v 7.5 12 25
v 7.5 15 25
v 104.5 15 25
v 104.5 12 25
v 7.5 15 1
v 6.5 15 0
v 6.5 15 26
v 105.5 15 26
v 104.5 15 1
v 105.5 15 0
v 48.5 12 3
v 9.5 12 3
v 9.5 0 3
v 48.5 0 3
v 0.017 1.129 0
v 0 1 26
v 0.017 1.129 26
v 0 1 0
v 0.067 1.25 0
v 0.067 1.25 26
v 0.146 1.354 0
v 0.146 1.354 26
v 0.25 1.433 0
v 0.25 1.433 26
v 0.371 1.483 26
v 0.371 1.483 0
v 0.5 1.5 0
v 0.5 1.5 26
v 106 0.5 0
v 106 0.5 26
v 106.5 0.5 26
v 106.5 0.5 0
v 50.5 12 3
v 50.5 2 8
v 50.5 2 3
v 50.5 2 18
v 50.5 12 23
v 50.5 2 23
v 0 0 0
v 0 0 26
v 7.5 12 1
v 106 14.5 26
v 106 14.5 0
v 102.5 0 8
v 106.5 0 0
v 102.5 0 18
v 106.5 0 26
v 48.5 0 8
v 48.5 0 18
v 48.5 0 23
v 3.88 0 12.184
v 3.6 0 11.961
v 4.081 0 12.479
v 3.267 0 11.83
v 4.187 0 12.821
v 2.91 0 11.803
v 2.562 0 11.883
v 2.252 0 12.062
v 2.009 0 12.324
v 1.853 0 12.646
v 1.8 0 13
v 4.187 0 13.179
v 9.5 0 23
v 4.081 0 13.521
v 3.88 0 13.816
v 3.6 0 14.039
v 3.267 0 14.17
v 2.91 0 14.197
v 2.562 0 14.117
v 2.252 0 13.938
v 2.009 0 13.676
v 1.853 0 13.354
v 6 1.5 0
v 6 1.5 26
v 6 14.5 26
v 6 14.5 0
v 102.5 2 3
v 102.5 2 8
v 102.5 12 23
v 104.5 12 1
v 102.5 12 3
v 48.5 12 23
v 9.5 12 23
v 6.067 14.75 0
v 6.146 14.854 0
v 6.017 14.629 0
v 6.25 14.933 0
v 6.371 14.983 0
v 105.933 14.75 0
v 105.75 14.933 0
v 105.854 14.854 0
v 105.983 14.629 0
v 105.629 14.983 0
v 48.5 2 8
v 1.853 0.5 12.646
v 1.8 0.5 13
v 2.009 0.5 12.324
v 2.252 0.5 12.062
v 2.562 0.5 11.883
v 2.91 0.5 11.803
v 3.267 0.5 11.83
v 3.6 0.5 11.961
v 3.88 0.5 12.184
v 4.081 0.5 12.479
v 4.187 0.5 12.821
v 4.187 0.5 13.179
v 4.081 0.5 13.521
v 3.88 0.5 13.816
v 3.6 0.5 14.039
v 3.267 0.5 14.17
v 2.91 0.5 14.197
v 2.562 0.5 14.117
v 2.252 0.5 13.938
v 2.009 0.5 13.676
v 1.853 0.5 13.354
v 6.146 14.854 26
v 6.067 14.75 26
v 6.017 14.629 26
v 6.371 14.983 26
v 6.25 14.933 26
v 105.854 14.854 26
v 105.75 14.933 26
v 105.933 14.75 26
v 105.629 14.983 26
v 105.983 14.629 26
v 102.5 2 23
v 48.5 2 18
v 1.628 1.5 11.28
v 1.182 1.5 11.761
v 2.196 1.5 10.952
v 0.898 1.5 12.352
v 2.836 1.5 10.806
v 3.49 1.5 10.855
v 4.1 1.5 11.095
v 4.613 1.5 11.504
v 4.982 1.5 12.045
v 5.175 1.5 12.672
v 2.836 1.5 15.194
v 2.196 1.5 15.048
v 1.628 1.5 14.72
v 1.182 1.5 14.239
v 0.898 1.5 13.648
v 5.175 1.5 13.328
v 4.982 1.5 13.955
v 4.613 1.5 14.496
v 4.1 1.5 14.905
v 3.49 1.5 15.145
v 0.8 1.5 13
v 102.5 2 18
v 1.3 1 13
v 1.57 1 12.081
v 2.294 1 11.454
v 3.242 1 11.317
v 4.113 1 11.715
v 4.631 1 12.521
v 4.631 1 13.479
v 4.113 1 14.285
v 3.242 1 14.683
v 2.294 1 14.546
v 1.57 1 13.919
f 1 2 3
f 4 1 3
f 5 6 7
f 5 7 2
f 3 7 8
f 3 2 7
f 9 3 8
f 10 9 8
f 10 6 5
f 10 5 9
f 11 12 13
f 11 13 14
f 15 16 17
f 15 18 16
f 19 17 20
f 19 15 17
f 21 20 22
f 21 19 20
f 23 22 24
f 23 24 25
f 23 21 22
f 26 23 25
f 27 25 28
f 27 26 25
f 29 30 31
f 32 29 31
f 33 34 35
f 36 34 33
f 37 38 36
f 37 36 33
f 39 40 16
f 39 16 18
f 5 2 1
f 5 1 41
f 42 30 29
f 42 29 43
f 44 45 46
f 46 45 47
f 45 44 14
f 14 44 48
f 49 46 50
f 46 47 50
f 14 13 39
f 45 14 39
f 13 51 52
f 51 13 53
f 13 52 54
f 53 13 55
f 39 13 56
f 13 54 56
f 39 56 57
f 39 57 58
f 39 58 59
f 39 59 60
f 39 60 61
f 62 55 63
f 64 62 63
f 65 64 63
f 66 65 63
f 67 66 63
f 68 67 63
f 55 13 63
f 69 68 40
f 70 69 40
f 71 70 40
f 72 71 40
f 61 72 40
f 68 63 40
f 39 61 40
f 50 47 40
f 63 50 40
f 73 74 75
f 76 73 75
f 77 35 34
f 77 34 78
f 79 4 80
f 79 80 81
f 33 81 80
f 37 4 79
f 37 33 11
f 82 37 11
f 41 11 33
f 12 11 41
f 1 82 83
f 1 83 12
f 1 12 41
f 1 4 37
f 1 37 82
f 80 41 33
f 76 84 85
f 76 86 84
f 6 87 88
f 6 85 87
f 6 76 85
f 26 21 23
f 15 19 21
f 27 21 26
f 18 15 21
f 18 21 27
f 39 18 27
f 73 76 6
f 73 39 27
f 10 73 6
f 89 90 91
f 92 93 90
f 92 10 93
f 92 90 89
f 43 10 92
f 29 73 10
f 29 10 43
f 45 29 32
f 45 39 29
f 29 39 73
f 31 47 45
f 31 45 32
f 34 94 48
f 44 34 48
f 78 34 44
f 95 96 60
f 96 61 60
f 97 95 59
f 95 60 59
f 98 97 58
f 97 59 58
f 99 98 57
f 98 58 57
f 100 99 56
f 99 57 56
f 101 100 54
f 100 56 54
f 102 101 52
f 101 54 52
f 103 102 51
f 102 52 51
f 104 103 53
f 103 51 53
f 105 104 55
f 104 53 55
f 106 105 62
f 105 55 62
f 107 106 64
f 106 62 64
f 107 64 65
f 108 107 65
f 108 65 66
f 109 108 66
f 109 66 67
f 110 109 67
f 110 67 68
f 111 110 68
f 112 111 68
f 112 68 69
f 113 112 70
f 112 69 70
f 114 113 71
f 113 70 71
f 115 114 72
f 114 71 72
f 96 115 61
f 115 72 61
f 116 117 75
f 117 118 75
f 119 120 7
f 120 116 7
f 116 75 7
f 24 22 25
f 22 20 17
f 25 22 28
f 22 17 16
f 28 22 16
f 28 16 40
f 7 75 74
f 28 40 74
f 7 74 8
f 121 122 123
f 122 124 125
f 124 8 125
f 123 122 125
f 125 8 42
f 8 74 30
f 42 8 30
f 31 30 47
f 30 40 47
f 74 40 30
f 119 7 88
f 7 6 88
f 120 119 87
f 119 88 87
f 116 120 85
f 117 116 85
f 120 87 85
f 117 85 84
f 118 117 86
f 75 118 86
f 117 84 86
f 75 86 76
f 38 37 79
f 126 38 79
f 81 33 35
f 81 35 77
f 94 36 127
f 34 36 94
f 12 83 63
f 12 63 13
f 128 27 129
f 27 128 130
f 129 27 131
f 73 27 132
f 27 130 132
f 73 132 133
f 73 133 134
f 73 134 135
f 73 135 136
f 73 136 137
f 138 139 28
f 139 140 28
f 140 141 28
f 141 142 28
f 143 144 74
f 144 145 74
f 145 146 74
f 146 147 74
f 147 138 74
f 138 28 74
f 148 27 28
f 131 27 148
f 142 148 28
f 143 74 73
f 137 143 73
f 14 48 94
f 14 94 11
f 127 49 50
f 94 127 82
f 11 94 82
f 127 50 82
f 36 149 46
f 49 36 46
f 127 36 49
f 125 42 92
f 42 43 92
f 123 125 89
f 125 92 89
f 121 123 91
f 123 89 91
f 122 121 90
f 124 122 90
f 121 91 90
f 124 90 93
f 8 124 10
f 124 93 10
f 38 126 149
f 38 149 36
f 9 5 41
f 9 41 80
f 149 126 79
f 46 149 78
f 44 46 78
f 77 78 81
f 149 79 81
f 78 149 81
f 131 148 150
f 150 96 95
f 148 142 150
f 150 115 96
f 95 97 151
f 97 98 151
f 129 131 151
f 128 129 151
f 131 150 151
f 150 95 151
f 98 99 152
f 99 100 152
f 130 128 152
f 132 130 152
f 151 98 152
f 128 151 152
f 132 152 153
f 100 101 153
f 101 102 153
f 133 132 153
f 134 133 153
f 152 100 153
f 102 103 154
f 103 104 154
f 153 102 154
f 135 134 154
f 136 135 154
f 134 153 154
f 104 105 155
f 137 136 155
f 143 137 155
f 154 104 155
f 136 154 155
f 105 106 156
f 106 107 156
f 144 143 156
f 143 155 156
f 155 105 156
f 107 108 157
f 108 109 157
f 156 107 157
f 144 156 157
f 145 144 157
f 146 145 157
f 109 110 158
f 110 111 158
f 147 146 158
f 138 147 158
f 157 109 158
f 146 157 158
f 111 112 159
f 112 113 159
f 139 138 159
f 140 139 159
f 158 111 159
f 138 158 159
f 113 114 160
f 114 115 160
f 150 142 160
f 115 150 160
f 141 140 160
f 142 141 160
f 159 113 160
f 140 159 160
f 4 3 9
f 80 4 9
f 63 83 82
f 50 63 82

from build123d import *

# Parameters (mm, degrees)
SKETCH1_W                                           = 107
SKETCH1_H                                           = 26
BOSS_EXTRUDE1_DEPTH                                 = 15
SKETCH2_W                                           = 1
SKETCH2_H                                           = 14.5
SKETCH2_W_2                                         = 6
SKETCH2_H_2                                         = 13.5
CUT_EXTRUDE1_DEPTH                                  = 112.130553854
FILLET1_R                                           = 0.5
CSK_FOR_M2_COUNTERSUNK_FLAT_HEAD_SCREW1_D           = 2.4
CSK_FOR_M2_COUNTERSUNK_FLAT_HEAD_SCREW1_DEPTH       = 15
CSK_FOR_M2_COUNTERSUNK_FLAT_HEAD_SCREW1_CSINK_D     = 4.4
CSK_FOR_M2_COUNTERSUNK_FLAT_HEAD_SCREW1_CSINK_ANGLE = 90
CSK_FOR_M2_COUNTERSUNK_FLAT_HEAD_SCREW1_TIP         = 0.721032743
SKETCH14_W                                          = 97
SKETCH14_H                                          = 24
CUT_EXTRUDE7_DEPTH                                  = 112.130553854
SKETCH14_3_W                                        = 97
SKETCH14_3_H                                        = 24
BOSS_EXTRUDE3_DEPTH                                 = 1
SKETCH18_W                                          = 97
SKETCH18_H                                          = 24
CUT_EXTRUDE8_DEPTH                                  = 112.130553854
SKETCH20_W                                          = 97
SKETCH20_H                                          = 24
SKETCH20_W_2                                        = 93
SKETCH20_H_2                                        = 20
BOSS_EXTRUDE4_DEPTH                                 = 15
SKETCH20_2_W                                        = 97
SKETCH20_2_H                                        = 24
SKETCH20_2_W_2                                      = 93
SKETCH20_2_H_2                                      = 20
CUT_EXTRUDE9_DEPTH                                  = 3
SKETCH21_W                                          = 52
SKETCH21_H                                          = 2
BOSS_EXTRUDE5_DEPTH                                 = 5
SKETCH22_W                                          = 52
SKETCH22_H                                          = 2
BOSS_EXTRUDE6_DEPTH                                 = 5
SKETCH23_W                                          = 0.5
SKETCH23_H                                          = 16.612240618
CUT_EXTRUDE10_DEPTH                                 = 112.130553854
BOSS_EXTRUDE7_REACH                                 = 111.983
SKETCH25_W                                          = 2
SKETCH25_H                                          = 12
CUT_EXTRUDE11_REACH                                 = 65.537
SKETCH26_W                                          = 10
SKETCH26_H                                          = 2


with BuildPart() as part:
    # Sketch1 → Boss-Extrude1 (new body)
    with BuildSketch(Plane(origin=(0, 0, 0), x_dir=(1, 0, 0), z_dir=(0, 1, 0))):
        with Locations((53.5, -13)):
            Rectangle(SKETCH1_W, SKETCH1_H)
    extrude(amount=BOSS_EXTRUDE1_DEPTH)

    # Sketch2 → Cut-Extrude1 (cut, through all)
    with BuildSketch(Plane.XY.offset(26)):
        with Locations((106.5, 7.75)):
            Rectangle(SKETCH2_W, SKETCH2_H)
        with Locations((3, 8.25)):
            Rectangle(SKETCH2_W_2, SKETCH2_H_2)
    extrude(amount=-CUT_EXTRUDE1_DEPTH, mode=Mode.SUBTRACT)

    # Fillet1
    fillet1_edges = [part.edges().sort_by_distance(p)[0] for p in [
        (106, 15, 13),
        (0, 1.5, 13),
        (6, 15, 13),
    ]]
    fillet(fillet1_edges, radius=FILLET1_R)

    # CSK for M2 Countersunk Flat Head Screw1
    with Locations(Plane(origin=(3, 1.5, 13), x_dir=(1, 0, 0), z_dir=(0, 1, 0))):
        with Locations((0, 0)):
            CounterSinkHole(CSK_FOR_M2_COUNTERSUNK_FLAT_HEAD_SCREW1_D / 2, CSK_FOR_M2_COUNTERSUNK_FLAT_HEAD_SCREW1_CSINK_D / 2, depth=CSK_FOR_M2_COUNTERSUNK_FLAT_HEAD_SCREW1_DEPTH, counter_sink_angle=CSK_FOR_M2_COUNTERSUNK_FLAT_HEAD_SCREW1_CSINK_ANGLE)
            with Locations((0, 0, -(CSK_FOR_M2_COUNTERSUNK_FLAT_HEAD_SCREW1_DEPTH + CSK_FOR_M2_COUNTERSUNK_FLAT_HEAD_SCREW1_TIP / 2))):  # 118° drill point
                Cone(0, CSK_FOR_M2_COUNTERSUNK_FLAT_HEAD_SCREW1_D / 2, CSK_FOR_M2_COUNTERSUNK_FLAT_HEAD_SCREW1_TIP, mode=Mode.SUBTRACT)

    # Sketch14 → Cut-Extrude7 (cut, through all)
    with BuildSketch(Plane(origin=(0, 15, 0), x_dir=(1, 0, 0), z_dir=(0, 1, 0))):
        with Locations((56, -13)):
            Rectangle(SKETCH14_W, SKETCH14_H)
    extrude(amount=-CUT_EXTRUDE7_DEPTH, mode=Mode.SUBTRACT)

    # Sketch14<3> → Boss-Extrude3 (add)
    with BuildSketch(Plane(origin=(0, 15, 0), x_dir=(1, 0, 0), z_dir=(0, 1, 0))):
        with Locations((56, -13)):
            Rectangle(SKETCH14_3_W, SKETCH14_3_H)
    extrude(amount=-BOSS_EXTRUDE3_DEPTH)

    # Sketch18 → Cut-Extrude8 (cut, through all)
    with BuildSketch(Plane(origin=(0, 0, 0), x_dir=(1, 0, 0), z_dir=(0, 1, 0))):
        with Locations((56, -13)):
            Rectangle(SKETCH18_W, SKETCH18_H)
    extrude(amount=CUT_EXTRUDE8_DEPTH, mode=Mode.SUBTRACT)

    # Sketch20 → Boss-Extrude4 (add)
    with BuildSketch(Plane(origin=(0, 15, 0), x_dir=(1, 0, 0), z_dir=(0, 1, 0))):
        with Locations((56, -13)):
            Rectangle(SKETCH20_W, SKETCH20_H)
        with Locations((56, -13)):
            Rectangle(SKETCH20_W_2, SKETCH20_H_2, mode=Mode.SUBTRACT)
    extrude(amount=-BOSS_EXTRUDE4_DEPTH)

    # Sketch20<2> → Cut-Extrude9 (cut)
    with BuildSketch(Plane(origin=(0, 15, 0), x_dir=(1, 0, 0), z_dir=(0, 1, 0))):
        with Locations((56, -13)):
            Rectangle(SKETCH20_2_W, SKETCH20_2_H)
        with Locations((56, -13)):
            Rectangle(SKETCH20_2_W_2, SKETCH20_2_H_2, mode=Mode.SUBTRACT)
    extrude(amount=-CUT_EXTRUDE9_DEPTH, mode=Mode.SUBTRACT)

    # Sketch21 → Boss-Extrude5 (add)
    with BuildSketch(Plane.XY.offset(3)):
        with Locations((76.5, 1)):
            Rectangle(SKETCH21_W, SKETCH21_H)
    extrude(amount=BOSS_EXTRUDE5_DEPTH)

    # Sketch22 → Boss-Extrude6 (add)
    with BuildSketch(Plane(origin=(0, 0, 23), x_dir=(-1, 0, 0), z_dir=(0, 0, -1))):
        with Locations((-76.5, 1)):
            Rectangle(SKETCH22_W, SKETCH22_H)
    extrude(amount=BOSS_EXTRUDE6_DEPTH)

    # Sketch23 → Cut-Extrude10 (cut, through all)
    with BuildSketch(Plane.XY.offset(26)):
        with Locations((106.75, 8.306120309)):
            Rectangle(SKETCH23_W, SKETCH23_H)
    extrude(amount=-CUT_EXTRUDE10_DEPTH, mode=Mode.SUBTRACT)

    # Sketch25 → Boss-Extrude7 (add, up to next)
    with BuildSketch(Plane(origin=(0, 0, 23), x_dir=(-1, 0, 0), z_dir=(0, 0, -1)), mode=Mode.PRIVATE) as boss_extrude7_sk1:
        with Locations((-49.5, 6)):
            Rectangle(SKETCH25_W, SKETCH25_H)
    boss_extrude7_tool1 = extrude(boss_extrude7_sk1.sketch, amount=BOSS_EXTRUDE7_REACH, mode=Mode.PRIVATE) - part.part
    add(boss_extrude7_tool1.solids().sort_by_distance((49.5, 6, 23))[0])

    # Sketch26 → Cut-Extrude11 (cut, up to next)
    with BuildSketch(Plane(origin=(50.5, 0, 0), x_dir=(0, 0, -1), z_dir=(1, 0, 0)), mode=Mode.PRIVATE) as cut_extrude11_sk1:
        with Locations((-13, 1)):
            Rectangle(SKETCH26_W, SKETCH26_H)
    cut_extrude11_tool1 = extrude(cut_extrude11_sk1.sketch, amount=-CUT_EXTRUDE11_REACH, mode=Mode.PRIVATE) & part.part
    add(cut_extrude11_tool1.solids().sort_by_distance((50.5, 1, 13))[0], mode=Mode.SUBTRACT)


solid = part.part
